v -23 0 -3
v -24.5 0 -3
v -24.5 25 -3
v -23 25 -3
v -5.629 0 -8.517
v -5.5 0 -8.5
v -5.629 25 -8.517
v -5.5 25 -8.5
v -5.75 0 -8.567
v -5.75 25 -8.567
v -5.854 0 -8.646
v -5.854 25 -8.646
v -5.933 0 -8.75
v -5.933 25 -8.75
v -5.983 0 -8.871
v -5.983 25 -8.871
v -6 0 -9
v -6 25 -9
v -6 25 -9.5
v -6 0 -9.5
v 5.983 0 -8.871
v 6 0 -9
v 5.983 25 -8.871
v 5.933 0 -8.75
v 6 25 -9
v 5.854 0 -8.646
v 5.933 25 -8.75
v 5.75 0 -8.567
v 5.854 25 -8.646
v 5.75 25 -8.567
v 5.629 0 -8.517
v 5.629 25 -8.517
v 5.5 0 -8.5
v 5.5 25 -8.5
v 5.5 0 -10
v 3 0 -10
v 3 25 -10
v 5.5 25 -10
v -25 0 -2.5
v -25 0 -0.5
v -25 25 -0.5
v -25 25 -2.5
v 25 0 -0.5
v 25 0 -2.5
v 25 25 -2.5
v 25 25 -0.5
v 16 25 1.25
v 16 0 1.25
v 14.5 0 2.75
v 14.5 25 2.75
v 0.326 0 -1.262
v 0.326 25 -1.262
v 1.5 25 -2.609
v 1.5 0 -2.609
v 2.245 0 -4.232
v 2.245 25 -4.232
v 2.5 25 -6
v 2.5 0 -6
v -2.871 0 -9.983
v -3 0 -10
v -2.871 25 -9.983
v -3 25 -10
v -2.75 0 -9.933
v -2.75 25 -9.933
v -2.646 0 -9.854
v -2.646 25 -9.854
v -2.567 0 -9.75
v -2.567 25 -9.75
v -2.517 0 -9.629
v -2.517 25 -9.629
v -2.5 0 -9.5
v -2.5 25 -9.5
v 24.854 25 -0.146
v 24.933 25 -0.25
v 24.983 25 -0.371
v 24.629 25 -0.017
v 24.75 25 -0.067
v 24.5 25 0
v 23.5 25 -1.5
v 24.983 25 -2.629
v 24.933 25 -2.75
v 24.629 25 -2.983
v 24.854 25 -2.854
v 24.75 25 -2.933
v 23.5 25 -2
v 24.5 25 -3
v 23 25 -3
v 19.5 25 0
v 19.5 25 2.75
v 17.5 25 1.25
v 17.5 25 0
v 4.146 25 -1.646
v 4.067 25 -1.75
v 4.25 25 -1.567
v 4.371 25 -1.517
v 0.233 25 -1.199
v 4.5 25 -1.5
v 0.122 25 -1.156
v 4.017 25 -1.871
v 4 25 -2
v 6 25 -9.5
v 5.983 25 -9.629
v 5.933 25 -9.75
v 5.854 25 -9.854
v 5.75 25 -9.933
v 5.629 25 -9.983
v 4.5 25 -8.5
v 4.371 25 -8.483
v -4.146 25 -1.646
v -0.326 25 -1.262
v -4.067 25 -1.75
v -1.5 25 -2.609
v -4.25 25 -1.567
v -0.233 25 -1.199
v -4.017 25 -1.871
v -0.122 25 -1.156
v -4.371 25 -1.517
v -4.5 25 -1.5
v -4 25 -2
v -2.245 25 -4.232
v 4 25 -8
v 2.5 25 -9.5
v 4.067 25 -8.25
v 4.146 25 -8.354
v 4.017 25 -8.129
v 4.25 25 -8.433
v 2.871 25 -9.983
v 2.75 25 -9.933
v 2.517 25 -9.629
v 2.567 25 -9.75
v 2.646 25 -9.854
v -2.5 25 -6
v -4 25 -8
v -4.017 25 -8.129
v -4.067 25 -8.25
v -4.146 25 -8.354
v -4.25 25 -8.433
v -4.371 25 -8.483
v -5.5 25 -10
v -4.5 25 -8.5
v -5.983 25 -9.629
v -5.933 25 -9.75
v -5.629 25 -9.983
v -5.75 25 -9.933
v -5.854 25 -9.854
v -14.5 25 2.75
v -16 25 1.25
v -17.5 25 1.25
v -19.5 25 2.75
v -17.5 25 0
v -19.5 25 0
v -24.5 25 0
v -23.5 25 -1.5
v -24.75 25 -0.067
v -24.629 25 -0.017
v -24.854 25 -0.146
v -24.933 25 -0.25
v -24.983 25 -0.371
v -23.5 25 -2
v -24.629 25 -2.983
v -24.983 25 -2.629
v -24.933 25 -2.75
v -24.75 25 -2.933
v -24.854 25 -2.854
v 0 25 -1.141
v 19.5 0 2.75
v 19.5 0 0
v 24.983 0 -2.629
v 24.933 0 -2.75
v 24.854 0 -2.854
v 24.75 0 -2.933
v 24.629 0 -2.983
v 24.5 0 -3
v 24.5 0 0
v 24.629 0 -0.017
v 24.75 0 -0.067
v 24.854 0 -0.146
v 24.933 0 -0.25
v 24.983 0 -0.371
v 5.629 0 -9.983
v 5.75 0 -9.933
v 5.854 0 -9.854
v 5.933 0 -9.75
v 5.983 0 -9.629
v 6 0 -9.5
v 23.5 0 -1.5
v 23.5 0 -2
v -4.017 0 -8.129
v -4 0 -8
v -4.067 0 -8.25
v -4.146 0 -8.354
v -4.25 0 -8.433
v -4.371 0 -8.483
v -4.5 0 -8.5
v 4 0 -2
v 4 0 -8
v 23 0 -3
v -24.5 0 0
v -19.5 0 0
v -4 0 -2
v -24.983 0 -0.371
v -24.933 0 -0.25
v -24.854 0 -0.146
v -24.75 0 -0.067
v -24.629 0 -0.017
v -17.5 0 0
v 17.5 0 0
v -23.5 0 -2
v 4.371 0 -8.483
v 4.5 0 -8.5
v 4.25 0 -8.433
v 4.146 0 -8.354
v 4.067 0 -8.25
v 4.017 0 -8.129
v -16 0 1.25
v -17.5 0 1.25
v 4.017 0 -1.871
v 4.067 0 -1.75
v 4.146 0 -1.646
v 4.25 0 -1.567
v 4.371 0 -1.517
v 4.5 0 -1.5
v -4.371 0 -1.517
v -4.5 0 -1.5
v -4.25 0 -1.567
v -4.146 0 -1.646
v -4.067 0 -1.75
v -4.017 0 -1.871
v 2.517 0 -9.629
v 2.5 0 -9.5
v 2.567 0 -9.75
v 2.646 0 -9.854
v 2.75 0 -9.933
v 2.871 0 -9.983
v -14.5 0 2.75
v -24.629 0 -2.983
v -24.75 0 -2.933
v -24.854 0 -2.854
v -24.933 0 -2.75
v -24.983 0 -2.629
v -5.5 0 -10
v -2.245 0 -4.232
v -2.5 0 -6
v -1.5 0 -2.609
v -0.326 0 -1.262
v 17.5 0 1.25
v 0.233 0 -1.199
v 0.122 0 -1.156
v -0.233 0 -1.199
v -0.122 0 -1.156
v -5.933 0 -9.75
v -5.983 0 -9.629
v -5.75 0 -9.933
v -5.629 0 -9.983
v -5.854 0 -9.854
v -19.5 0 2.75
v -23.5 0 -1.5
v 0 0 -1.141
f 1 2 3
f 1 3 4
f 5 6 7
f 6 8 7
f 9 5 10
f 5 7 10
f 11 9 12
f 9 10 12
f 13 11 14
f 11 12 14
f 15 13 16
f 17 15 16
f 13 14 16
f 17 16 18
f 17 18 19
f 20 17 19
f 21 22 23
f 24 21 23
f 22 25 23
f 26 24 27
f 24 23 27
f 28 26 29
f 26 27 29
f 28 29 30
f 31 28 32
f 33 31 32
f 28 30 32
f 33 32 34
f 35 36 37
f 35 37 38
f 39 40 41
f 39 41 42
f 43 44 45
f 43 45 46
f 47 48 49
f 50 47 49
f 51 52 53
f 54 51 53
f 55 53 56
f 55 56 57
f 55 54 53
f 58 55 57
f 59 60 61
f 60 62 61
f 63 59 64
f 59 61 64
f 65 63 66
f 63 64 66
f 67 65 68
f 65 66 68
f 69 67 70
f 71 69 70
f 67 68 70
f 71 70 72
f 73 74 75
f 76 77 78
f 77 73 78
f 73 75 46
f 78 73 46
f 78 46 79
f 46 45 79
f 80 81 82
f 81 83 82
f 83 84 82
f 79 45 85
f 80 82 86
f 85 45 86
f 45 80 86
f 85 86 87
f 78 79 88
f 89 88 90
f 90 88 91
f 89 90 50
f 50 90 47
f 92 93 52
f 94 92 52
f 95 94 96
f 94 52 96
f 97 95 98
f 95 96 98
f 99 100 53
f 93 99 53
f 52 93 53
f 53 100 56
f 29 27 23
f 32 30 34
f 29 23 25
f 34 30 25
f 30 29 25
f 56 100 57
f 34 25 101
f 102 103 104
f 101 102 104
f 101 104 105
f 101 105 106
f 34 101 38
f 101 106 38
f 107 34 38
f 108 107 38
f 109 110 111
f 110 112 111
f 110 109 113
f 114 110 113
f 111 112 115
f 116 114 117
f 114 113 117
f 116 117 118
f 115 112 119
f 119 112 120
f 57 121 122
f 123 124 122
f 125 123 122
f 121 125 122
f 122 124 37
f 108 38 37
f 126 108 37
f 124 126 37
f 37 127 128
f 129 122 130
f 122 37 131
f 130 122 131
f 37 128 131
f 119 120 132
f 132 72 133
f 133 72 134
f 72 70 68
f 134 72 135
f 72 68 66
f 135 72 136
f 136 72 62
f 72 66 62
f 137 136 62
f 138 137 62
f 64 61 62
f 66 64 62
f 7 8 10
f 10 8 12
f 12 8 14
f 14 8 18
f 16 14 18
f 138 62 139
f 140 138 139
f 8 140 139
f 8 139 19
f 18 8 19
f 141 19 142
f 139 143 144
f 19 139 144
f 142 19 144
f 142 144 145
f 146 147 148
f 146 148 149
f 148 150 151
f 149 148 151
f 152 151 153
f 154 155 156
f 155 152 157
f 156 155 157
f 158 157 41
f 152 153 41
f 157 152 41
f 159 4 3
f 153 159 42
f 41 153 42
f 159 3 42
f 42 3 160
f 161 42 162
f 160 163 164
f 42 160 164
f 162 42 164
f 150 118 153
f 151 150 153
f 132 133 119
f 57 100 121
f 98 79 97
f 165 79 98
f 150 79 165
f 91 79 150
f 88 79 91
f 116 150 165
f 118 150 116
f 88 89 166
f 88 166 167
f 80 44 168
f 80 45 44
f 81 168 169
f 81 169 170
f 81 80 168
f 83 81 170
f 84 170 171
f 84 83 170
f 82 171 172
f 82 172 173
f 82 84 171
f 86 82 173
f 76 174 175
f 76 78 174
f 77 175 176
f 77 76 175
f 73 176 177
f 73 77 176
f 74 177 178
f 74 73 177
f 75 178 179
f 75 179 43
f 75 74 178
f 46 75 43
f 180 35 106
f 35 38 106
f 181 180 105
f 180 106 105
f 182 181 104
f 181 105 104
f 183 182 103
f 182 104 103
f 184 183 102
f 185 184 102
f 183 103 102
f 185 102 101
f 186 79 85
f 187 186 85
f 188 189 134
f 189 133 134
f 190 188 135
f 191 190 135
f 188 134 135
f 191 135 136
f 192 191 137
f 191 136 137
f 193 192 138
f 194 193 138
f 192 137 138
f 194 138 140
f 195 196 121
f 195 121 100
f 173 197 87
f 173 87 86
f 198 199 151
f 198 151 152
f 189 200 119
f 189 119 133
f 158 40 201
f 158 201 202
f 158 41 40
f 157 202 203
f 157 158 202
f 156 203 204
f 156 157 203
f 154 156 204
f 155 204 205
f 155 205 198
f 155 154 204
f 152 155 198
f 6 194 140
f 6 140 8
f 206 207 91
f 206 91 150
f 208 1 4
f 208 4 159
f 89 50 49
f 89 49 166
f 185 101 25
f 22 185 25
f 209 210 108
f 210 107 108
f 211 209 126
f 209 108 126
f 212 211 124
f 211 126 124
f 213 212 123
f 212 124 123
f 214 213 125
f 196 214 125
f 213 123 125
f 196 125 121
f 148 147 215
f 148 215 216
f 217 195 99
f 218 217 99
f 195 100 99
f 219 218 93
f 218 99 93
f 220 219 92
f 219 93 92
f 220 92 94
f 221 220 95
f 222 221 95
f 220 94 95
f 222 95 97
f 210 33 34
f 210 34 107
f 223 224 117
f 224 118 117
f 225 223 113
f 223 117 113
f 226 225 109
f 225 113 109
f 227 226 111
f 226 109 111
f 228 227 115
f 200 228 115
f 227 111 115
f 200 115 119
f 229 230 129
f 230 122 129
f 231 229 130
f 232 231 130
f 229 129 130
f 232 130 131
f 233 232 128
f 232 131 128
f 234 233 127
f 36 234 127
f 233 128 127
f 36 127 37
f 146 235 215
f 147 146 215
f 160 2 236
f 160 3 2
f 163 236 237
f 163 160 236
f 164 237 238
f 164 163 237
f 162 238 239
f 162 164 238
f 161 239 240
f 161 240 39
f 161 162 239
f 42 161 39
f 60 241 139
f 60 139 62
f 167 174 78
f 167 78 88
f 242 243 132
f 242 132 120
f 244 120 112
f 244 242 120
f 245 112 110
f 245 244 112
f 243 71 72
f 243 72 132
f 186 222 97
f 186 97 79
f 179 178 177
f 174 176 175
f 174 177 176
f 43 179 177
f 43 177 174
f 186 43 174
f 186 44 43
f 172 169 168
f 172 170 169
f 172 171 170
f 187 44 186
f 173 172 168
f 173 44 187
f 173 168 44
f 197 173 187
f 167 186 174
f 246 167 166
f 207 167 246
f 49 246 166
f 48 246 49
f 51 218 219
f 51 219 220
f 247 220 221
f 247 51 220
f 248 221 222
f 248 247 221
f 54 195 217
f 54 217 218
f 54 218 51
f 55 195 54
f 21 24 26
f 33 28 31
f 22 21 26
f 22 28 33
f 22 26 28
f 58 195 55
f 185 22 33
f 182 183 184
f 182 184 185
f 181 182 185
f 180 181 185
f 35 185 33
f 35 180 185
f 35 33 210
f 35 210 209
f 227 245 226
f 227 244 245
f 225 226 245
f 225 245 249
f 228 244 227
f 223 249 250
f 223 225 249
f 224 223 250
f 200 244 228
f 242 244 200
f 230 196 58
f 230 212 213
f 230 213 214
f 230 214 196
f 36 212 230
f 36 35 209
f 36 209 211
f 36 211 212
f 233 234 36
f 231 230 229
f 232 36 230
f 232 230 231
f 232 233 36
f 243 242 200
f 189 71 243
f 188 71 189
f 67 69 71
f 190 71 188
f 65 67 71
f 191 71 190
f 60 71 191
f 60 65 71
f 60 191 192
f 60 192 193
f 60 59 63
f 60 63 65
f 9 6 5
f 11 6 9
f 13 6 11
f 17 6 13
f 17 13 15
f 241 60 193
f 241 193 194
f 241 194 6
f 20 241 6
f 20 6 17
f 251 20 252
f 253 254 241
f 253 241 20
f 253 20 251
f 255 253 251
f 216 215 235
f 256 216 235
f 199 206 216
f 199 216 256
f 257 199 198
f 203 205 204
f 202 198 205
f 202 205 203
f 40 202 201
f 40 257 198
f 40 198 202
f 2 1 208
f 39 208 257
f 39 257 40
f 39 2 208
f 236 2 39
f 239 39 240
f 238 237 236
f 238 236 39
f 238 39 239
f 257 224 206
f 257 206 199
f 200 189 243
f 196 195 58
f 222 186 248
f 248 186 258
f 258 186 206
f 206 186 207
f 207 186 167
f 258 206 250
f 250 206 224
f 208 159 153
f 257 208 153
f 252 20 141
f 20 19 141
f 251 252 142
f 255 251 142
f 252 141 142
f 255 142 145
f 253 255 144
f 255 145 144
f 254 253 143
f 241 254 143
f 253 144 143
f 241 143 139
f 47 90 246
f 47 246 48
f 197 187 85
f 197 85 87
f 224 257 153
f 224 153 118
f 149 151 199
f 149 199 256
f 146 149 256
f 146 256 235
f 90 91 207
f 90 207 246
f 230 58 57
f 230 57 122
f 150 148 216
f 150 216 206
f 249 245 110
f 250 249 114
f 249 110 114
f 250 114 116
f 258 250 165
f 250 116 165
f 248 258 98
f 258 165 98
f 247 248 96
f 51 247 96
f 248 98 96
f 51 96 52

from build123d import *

# Parameters (mm, degrees)
BOSS_EXTRUDE1_DEPTH = 25
FILLET1_R           = 0.5
FILLET2_R           = 0.5
BOSS_EXTRUDE2_DEPTH = 25


with BuildPart() as part:
    # Sketch6 → Boss-Extrude1 (new body)
    with BuildSketch(Plane(origin=(0, 0, 0), x_dir=(1, 0, 0), z_dir=(0, 1, 0))):
        with BuildLine():
            Line((-23.5, 1.5), (-4, 1.5))
            Line((-4, 1.5), (-4, 8.5))
            Line((-4, 8.5), (-6, 8.5))
            Line((-6, 8.5), (-6, 10))
            Line((-6, 10), (-2.5, 10))
            Line((-2.5, 10), (-2.5, 6))
            ThreePointArc((-2.5, 6), (-1.840169944, 3.204915028), (0, 1))
            ThreePointArc((0, 1), (1.840169944, 3.204915028), (2.5, 6))
            Line((2.5, 6), (2.5, 10))
            Line((2.5, 10), (6, 10))
            Line((6, 10), (6, 8.5))
            Line((6, 8.5), (4, 8.5))
            Line((4, 8.5), (4, 1.5))
            Line((4, 1.5), (23.5, 1.5))
            Line((23.5, 1.5), (23.5, 2))
            Line((23.5, 2), (23, 3))
            Line((23, 3), (25, 3))
            Line((25, 3), (25, 0))
            Line((25, 0), (2.5, 0))
            Line((2.5, 0), (-2.5, 0))
            Line((-2.5, 0), (-25, 0))
            Line((-25, 0), (-25, 3))
            Line((-25, 3), (-23, 3))
            Line((-23, 3), (-23.5, 2))
            Line((-23.5, 2), (-23.5, 1.5))
        make_face()
    extrude(amount=BOSS_EXTRUDE1_DEPTH)

    # Fillet1
    fillet1_edges = [part.edges().sort_by_distance(p)[0] for p in [
        (-4, 12.5, -1.5),
        (-4, 12.5, -8.5),
        (0, 12.5, -1),
        (4, 12.5, -8.5),
        (4, 12.5, -1.5),
    ]]
    fillet(fillet1_edges, radius=FILLET1_R)

    # Fillet2
    fillet2_edges = [part.edges().sort_by_distance(p)[0] for p in [
        (-6, 12.5, -8.5),
        (-6, 12.5, -10),
        (-2.5, 12.5, -10),
        (2.5, 12.5, -10),
        (6, 12.5, -10),
        (6, 12.5, -8.5),
        (25, 12.5, -3),
        (25, 12.5, 0),
        (-25, 12.5, 0),
        (-25, 12.5, -3),
    ]]
    fillet(fillet2_edges, radius=FILLET2_R)

    # Sketch7 → Boss-Extrude2 (add)
    with BuildSketch(Plane(origin=(0, 25, 0), x_dir=(1, 0, 0), z_dir=(0, 1, 0))):
        Polygon((-19.5, 0), (-19.5, -2.75), (-14.5, -2.75), (-16, -1.25), (-17.5, -1.25), (-17.5, 0), align=None)
        Polygon((19.5, 0), (17.5, 0), (17.5, -1.25), (16, -1.25), (14.5, -2.75), (19.5, -2.75), align=None)
    extrude(amount=-BOSS_EXTRUDE2_DEPTH)


solid = part.part
